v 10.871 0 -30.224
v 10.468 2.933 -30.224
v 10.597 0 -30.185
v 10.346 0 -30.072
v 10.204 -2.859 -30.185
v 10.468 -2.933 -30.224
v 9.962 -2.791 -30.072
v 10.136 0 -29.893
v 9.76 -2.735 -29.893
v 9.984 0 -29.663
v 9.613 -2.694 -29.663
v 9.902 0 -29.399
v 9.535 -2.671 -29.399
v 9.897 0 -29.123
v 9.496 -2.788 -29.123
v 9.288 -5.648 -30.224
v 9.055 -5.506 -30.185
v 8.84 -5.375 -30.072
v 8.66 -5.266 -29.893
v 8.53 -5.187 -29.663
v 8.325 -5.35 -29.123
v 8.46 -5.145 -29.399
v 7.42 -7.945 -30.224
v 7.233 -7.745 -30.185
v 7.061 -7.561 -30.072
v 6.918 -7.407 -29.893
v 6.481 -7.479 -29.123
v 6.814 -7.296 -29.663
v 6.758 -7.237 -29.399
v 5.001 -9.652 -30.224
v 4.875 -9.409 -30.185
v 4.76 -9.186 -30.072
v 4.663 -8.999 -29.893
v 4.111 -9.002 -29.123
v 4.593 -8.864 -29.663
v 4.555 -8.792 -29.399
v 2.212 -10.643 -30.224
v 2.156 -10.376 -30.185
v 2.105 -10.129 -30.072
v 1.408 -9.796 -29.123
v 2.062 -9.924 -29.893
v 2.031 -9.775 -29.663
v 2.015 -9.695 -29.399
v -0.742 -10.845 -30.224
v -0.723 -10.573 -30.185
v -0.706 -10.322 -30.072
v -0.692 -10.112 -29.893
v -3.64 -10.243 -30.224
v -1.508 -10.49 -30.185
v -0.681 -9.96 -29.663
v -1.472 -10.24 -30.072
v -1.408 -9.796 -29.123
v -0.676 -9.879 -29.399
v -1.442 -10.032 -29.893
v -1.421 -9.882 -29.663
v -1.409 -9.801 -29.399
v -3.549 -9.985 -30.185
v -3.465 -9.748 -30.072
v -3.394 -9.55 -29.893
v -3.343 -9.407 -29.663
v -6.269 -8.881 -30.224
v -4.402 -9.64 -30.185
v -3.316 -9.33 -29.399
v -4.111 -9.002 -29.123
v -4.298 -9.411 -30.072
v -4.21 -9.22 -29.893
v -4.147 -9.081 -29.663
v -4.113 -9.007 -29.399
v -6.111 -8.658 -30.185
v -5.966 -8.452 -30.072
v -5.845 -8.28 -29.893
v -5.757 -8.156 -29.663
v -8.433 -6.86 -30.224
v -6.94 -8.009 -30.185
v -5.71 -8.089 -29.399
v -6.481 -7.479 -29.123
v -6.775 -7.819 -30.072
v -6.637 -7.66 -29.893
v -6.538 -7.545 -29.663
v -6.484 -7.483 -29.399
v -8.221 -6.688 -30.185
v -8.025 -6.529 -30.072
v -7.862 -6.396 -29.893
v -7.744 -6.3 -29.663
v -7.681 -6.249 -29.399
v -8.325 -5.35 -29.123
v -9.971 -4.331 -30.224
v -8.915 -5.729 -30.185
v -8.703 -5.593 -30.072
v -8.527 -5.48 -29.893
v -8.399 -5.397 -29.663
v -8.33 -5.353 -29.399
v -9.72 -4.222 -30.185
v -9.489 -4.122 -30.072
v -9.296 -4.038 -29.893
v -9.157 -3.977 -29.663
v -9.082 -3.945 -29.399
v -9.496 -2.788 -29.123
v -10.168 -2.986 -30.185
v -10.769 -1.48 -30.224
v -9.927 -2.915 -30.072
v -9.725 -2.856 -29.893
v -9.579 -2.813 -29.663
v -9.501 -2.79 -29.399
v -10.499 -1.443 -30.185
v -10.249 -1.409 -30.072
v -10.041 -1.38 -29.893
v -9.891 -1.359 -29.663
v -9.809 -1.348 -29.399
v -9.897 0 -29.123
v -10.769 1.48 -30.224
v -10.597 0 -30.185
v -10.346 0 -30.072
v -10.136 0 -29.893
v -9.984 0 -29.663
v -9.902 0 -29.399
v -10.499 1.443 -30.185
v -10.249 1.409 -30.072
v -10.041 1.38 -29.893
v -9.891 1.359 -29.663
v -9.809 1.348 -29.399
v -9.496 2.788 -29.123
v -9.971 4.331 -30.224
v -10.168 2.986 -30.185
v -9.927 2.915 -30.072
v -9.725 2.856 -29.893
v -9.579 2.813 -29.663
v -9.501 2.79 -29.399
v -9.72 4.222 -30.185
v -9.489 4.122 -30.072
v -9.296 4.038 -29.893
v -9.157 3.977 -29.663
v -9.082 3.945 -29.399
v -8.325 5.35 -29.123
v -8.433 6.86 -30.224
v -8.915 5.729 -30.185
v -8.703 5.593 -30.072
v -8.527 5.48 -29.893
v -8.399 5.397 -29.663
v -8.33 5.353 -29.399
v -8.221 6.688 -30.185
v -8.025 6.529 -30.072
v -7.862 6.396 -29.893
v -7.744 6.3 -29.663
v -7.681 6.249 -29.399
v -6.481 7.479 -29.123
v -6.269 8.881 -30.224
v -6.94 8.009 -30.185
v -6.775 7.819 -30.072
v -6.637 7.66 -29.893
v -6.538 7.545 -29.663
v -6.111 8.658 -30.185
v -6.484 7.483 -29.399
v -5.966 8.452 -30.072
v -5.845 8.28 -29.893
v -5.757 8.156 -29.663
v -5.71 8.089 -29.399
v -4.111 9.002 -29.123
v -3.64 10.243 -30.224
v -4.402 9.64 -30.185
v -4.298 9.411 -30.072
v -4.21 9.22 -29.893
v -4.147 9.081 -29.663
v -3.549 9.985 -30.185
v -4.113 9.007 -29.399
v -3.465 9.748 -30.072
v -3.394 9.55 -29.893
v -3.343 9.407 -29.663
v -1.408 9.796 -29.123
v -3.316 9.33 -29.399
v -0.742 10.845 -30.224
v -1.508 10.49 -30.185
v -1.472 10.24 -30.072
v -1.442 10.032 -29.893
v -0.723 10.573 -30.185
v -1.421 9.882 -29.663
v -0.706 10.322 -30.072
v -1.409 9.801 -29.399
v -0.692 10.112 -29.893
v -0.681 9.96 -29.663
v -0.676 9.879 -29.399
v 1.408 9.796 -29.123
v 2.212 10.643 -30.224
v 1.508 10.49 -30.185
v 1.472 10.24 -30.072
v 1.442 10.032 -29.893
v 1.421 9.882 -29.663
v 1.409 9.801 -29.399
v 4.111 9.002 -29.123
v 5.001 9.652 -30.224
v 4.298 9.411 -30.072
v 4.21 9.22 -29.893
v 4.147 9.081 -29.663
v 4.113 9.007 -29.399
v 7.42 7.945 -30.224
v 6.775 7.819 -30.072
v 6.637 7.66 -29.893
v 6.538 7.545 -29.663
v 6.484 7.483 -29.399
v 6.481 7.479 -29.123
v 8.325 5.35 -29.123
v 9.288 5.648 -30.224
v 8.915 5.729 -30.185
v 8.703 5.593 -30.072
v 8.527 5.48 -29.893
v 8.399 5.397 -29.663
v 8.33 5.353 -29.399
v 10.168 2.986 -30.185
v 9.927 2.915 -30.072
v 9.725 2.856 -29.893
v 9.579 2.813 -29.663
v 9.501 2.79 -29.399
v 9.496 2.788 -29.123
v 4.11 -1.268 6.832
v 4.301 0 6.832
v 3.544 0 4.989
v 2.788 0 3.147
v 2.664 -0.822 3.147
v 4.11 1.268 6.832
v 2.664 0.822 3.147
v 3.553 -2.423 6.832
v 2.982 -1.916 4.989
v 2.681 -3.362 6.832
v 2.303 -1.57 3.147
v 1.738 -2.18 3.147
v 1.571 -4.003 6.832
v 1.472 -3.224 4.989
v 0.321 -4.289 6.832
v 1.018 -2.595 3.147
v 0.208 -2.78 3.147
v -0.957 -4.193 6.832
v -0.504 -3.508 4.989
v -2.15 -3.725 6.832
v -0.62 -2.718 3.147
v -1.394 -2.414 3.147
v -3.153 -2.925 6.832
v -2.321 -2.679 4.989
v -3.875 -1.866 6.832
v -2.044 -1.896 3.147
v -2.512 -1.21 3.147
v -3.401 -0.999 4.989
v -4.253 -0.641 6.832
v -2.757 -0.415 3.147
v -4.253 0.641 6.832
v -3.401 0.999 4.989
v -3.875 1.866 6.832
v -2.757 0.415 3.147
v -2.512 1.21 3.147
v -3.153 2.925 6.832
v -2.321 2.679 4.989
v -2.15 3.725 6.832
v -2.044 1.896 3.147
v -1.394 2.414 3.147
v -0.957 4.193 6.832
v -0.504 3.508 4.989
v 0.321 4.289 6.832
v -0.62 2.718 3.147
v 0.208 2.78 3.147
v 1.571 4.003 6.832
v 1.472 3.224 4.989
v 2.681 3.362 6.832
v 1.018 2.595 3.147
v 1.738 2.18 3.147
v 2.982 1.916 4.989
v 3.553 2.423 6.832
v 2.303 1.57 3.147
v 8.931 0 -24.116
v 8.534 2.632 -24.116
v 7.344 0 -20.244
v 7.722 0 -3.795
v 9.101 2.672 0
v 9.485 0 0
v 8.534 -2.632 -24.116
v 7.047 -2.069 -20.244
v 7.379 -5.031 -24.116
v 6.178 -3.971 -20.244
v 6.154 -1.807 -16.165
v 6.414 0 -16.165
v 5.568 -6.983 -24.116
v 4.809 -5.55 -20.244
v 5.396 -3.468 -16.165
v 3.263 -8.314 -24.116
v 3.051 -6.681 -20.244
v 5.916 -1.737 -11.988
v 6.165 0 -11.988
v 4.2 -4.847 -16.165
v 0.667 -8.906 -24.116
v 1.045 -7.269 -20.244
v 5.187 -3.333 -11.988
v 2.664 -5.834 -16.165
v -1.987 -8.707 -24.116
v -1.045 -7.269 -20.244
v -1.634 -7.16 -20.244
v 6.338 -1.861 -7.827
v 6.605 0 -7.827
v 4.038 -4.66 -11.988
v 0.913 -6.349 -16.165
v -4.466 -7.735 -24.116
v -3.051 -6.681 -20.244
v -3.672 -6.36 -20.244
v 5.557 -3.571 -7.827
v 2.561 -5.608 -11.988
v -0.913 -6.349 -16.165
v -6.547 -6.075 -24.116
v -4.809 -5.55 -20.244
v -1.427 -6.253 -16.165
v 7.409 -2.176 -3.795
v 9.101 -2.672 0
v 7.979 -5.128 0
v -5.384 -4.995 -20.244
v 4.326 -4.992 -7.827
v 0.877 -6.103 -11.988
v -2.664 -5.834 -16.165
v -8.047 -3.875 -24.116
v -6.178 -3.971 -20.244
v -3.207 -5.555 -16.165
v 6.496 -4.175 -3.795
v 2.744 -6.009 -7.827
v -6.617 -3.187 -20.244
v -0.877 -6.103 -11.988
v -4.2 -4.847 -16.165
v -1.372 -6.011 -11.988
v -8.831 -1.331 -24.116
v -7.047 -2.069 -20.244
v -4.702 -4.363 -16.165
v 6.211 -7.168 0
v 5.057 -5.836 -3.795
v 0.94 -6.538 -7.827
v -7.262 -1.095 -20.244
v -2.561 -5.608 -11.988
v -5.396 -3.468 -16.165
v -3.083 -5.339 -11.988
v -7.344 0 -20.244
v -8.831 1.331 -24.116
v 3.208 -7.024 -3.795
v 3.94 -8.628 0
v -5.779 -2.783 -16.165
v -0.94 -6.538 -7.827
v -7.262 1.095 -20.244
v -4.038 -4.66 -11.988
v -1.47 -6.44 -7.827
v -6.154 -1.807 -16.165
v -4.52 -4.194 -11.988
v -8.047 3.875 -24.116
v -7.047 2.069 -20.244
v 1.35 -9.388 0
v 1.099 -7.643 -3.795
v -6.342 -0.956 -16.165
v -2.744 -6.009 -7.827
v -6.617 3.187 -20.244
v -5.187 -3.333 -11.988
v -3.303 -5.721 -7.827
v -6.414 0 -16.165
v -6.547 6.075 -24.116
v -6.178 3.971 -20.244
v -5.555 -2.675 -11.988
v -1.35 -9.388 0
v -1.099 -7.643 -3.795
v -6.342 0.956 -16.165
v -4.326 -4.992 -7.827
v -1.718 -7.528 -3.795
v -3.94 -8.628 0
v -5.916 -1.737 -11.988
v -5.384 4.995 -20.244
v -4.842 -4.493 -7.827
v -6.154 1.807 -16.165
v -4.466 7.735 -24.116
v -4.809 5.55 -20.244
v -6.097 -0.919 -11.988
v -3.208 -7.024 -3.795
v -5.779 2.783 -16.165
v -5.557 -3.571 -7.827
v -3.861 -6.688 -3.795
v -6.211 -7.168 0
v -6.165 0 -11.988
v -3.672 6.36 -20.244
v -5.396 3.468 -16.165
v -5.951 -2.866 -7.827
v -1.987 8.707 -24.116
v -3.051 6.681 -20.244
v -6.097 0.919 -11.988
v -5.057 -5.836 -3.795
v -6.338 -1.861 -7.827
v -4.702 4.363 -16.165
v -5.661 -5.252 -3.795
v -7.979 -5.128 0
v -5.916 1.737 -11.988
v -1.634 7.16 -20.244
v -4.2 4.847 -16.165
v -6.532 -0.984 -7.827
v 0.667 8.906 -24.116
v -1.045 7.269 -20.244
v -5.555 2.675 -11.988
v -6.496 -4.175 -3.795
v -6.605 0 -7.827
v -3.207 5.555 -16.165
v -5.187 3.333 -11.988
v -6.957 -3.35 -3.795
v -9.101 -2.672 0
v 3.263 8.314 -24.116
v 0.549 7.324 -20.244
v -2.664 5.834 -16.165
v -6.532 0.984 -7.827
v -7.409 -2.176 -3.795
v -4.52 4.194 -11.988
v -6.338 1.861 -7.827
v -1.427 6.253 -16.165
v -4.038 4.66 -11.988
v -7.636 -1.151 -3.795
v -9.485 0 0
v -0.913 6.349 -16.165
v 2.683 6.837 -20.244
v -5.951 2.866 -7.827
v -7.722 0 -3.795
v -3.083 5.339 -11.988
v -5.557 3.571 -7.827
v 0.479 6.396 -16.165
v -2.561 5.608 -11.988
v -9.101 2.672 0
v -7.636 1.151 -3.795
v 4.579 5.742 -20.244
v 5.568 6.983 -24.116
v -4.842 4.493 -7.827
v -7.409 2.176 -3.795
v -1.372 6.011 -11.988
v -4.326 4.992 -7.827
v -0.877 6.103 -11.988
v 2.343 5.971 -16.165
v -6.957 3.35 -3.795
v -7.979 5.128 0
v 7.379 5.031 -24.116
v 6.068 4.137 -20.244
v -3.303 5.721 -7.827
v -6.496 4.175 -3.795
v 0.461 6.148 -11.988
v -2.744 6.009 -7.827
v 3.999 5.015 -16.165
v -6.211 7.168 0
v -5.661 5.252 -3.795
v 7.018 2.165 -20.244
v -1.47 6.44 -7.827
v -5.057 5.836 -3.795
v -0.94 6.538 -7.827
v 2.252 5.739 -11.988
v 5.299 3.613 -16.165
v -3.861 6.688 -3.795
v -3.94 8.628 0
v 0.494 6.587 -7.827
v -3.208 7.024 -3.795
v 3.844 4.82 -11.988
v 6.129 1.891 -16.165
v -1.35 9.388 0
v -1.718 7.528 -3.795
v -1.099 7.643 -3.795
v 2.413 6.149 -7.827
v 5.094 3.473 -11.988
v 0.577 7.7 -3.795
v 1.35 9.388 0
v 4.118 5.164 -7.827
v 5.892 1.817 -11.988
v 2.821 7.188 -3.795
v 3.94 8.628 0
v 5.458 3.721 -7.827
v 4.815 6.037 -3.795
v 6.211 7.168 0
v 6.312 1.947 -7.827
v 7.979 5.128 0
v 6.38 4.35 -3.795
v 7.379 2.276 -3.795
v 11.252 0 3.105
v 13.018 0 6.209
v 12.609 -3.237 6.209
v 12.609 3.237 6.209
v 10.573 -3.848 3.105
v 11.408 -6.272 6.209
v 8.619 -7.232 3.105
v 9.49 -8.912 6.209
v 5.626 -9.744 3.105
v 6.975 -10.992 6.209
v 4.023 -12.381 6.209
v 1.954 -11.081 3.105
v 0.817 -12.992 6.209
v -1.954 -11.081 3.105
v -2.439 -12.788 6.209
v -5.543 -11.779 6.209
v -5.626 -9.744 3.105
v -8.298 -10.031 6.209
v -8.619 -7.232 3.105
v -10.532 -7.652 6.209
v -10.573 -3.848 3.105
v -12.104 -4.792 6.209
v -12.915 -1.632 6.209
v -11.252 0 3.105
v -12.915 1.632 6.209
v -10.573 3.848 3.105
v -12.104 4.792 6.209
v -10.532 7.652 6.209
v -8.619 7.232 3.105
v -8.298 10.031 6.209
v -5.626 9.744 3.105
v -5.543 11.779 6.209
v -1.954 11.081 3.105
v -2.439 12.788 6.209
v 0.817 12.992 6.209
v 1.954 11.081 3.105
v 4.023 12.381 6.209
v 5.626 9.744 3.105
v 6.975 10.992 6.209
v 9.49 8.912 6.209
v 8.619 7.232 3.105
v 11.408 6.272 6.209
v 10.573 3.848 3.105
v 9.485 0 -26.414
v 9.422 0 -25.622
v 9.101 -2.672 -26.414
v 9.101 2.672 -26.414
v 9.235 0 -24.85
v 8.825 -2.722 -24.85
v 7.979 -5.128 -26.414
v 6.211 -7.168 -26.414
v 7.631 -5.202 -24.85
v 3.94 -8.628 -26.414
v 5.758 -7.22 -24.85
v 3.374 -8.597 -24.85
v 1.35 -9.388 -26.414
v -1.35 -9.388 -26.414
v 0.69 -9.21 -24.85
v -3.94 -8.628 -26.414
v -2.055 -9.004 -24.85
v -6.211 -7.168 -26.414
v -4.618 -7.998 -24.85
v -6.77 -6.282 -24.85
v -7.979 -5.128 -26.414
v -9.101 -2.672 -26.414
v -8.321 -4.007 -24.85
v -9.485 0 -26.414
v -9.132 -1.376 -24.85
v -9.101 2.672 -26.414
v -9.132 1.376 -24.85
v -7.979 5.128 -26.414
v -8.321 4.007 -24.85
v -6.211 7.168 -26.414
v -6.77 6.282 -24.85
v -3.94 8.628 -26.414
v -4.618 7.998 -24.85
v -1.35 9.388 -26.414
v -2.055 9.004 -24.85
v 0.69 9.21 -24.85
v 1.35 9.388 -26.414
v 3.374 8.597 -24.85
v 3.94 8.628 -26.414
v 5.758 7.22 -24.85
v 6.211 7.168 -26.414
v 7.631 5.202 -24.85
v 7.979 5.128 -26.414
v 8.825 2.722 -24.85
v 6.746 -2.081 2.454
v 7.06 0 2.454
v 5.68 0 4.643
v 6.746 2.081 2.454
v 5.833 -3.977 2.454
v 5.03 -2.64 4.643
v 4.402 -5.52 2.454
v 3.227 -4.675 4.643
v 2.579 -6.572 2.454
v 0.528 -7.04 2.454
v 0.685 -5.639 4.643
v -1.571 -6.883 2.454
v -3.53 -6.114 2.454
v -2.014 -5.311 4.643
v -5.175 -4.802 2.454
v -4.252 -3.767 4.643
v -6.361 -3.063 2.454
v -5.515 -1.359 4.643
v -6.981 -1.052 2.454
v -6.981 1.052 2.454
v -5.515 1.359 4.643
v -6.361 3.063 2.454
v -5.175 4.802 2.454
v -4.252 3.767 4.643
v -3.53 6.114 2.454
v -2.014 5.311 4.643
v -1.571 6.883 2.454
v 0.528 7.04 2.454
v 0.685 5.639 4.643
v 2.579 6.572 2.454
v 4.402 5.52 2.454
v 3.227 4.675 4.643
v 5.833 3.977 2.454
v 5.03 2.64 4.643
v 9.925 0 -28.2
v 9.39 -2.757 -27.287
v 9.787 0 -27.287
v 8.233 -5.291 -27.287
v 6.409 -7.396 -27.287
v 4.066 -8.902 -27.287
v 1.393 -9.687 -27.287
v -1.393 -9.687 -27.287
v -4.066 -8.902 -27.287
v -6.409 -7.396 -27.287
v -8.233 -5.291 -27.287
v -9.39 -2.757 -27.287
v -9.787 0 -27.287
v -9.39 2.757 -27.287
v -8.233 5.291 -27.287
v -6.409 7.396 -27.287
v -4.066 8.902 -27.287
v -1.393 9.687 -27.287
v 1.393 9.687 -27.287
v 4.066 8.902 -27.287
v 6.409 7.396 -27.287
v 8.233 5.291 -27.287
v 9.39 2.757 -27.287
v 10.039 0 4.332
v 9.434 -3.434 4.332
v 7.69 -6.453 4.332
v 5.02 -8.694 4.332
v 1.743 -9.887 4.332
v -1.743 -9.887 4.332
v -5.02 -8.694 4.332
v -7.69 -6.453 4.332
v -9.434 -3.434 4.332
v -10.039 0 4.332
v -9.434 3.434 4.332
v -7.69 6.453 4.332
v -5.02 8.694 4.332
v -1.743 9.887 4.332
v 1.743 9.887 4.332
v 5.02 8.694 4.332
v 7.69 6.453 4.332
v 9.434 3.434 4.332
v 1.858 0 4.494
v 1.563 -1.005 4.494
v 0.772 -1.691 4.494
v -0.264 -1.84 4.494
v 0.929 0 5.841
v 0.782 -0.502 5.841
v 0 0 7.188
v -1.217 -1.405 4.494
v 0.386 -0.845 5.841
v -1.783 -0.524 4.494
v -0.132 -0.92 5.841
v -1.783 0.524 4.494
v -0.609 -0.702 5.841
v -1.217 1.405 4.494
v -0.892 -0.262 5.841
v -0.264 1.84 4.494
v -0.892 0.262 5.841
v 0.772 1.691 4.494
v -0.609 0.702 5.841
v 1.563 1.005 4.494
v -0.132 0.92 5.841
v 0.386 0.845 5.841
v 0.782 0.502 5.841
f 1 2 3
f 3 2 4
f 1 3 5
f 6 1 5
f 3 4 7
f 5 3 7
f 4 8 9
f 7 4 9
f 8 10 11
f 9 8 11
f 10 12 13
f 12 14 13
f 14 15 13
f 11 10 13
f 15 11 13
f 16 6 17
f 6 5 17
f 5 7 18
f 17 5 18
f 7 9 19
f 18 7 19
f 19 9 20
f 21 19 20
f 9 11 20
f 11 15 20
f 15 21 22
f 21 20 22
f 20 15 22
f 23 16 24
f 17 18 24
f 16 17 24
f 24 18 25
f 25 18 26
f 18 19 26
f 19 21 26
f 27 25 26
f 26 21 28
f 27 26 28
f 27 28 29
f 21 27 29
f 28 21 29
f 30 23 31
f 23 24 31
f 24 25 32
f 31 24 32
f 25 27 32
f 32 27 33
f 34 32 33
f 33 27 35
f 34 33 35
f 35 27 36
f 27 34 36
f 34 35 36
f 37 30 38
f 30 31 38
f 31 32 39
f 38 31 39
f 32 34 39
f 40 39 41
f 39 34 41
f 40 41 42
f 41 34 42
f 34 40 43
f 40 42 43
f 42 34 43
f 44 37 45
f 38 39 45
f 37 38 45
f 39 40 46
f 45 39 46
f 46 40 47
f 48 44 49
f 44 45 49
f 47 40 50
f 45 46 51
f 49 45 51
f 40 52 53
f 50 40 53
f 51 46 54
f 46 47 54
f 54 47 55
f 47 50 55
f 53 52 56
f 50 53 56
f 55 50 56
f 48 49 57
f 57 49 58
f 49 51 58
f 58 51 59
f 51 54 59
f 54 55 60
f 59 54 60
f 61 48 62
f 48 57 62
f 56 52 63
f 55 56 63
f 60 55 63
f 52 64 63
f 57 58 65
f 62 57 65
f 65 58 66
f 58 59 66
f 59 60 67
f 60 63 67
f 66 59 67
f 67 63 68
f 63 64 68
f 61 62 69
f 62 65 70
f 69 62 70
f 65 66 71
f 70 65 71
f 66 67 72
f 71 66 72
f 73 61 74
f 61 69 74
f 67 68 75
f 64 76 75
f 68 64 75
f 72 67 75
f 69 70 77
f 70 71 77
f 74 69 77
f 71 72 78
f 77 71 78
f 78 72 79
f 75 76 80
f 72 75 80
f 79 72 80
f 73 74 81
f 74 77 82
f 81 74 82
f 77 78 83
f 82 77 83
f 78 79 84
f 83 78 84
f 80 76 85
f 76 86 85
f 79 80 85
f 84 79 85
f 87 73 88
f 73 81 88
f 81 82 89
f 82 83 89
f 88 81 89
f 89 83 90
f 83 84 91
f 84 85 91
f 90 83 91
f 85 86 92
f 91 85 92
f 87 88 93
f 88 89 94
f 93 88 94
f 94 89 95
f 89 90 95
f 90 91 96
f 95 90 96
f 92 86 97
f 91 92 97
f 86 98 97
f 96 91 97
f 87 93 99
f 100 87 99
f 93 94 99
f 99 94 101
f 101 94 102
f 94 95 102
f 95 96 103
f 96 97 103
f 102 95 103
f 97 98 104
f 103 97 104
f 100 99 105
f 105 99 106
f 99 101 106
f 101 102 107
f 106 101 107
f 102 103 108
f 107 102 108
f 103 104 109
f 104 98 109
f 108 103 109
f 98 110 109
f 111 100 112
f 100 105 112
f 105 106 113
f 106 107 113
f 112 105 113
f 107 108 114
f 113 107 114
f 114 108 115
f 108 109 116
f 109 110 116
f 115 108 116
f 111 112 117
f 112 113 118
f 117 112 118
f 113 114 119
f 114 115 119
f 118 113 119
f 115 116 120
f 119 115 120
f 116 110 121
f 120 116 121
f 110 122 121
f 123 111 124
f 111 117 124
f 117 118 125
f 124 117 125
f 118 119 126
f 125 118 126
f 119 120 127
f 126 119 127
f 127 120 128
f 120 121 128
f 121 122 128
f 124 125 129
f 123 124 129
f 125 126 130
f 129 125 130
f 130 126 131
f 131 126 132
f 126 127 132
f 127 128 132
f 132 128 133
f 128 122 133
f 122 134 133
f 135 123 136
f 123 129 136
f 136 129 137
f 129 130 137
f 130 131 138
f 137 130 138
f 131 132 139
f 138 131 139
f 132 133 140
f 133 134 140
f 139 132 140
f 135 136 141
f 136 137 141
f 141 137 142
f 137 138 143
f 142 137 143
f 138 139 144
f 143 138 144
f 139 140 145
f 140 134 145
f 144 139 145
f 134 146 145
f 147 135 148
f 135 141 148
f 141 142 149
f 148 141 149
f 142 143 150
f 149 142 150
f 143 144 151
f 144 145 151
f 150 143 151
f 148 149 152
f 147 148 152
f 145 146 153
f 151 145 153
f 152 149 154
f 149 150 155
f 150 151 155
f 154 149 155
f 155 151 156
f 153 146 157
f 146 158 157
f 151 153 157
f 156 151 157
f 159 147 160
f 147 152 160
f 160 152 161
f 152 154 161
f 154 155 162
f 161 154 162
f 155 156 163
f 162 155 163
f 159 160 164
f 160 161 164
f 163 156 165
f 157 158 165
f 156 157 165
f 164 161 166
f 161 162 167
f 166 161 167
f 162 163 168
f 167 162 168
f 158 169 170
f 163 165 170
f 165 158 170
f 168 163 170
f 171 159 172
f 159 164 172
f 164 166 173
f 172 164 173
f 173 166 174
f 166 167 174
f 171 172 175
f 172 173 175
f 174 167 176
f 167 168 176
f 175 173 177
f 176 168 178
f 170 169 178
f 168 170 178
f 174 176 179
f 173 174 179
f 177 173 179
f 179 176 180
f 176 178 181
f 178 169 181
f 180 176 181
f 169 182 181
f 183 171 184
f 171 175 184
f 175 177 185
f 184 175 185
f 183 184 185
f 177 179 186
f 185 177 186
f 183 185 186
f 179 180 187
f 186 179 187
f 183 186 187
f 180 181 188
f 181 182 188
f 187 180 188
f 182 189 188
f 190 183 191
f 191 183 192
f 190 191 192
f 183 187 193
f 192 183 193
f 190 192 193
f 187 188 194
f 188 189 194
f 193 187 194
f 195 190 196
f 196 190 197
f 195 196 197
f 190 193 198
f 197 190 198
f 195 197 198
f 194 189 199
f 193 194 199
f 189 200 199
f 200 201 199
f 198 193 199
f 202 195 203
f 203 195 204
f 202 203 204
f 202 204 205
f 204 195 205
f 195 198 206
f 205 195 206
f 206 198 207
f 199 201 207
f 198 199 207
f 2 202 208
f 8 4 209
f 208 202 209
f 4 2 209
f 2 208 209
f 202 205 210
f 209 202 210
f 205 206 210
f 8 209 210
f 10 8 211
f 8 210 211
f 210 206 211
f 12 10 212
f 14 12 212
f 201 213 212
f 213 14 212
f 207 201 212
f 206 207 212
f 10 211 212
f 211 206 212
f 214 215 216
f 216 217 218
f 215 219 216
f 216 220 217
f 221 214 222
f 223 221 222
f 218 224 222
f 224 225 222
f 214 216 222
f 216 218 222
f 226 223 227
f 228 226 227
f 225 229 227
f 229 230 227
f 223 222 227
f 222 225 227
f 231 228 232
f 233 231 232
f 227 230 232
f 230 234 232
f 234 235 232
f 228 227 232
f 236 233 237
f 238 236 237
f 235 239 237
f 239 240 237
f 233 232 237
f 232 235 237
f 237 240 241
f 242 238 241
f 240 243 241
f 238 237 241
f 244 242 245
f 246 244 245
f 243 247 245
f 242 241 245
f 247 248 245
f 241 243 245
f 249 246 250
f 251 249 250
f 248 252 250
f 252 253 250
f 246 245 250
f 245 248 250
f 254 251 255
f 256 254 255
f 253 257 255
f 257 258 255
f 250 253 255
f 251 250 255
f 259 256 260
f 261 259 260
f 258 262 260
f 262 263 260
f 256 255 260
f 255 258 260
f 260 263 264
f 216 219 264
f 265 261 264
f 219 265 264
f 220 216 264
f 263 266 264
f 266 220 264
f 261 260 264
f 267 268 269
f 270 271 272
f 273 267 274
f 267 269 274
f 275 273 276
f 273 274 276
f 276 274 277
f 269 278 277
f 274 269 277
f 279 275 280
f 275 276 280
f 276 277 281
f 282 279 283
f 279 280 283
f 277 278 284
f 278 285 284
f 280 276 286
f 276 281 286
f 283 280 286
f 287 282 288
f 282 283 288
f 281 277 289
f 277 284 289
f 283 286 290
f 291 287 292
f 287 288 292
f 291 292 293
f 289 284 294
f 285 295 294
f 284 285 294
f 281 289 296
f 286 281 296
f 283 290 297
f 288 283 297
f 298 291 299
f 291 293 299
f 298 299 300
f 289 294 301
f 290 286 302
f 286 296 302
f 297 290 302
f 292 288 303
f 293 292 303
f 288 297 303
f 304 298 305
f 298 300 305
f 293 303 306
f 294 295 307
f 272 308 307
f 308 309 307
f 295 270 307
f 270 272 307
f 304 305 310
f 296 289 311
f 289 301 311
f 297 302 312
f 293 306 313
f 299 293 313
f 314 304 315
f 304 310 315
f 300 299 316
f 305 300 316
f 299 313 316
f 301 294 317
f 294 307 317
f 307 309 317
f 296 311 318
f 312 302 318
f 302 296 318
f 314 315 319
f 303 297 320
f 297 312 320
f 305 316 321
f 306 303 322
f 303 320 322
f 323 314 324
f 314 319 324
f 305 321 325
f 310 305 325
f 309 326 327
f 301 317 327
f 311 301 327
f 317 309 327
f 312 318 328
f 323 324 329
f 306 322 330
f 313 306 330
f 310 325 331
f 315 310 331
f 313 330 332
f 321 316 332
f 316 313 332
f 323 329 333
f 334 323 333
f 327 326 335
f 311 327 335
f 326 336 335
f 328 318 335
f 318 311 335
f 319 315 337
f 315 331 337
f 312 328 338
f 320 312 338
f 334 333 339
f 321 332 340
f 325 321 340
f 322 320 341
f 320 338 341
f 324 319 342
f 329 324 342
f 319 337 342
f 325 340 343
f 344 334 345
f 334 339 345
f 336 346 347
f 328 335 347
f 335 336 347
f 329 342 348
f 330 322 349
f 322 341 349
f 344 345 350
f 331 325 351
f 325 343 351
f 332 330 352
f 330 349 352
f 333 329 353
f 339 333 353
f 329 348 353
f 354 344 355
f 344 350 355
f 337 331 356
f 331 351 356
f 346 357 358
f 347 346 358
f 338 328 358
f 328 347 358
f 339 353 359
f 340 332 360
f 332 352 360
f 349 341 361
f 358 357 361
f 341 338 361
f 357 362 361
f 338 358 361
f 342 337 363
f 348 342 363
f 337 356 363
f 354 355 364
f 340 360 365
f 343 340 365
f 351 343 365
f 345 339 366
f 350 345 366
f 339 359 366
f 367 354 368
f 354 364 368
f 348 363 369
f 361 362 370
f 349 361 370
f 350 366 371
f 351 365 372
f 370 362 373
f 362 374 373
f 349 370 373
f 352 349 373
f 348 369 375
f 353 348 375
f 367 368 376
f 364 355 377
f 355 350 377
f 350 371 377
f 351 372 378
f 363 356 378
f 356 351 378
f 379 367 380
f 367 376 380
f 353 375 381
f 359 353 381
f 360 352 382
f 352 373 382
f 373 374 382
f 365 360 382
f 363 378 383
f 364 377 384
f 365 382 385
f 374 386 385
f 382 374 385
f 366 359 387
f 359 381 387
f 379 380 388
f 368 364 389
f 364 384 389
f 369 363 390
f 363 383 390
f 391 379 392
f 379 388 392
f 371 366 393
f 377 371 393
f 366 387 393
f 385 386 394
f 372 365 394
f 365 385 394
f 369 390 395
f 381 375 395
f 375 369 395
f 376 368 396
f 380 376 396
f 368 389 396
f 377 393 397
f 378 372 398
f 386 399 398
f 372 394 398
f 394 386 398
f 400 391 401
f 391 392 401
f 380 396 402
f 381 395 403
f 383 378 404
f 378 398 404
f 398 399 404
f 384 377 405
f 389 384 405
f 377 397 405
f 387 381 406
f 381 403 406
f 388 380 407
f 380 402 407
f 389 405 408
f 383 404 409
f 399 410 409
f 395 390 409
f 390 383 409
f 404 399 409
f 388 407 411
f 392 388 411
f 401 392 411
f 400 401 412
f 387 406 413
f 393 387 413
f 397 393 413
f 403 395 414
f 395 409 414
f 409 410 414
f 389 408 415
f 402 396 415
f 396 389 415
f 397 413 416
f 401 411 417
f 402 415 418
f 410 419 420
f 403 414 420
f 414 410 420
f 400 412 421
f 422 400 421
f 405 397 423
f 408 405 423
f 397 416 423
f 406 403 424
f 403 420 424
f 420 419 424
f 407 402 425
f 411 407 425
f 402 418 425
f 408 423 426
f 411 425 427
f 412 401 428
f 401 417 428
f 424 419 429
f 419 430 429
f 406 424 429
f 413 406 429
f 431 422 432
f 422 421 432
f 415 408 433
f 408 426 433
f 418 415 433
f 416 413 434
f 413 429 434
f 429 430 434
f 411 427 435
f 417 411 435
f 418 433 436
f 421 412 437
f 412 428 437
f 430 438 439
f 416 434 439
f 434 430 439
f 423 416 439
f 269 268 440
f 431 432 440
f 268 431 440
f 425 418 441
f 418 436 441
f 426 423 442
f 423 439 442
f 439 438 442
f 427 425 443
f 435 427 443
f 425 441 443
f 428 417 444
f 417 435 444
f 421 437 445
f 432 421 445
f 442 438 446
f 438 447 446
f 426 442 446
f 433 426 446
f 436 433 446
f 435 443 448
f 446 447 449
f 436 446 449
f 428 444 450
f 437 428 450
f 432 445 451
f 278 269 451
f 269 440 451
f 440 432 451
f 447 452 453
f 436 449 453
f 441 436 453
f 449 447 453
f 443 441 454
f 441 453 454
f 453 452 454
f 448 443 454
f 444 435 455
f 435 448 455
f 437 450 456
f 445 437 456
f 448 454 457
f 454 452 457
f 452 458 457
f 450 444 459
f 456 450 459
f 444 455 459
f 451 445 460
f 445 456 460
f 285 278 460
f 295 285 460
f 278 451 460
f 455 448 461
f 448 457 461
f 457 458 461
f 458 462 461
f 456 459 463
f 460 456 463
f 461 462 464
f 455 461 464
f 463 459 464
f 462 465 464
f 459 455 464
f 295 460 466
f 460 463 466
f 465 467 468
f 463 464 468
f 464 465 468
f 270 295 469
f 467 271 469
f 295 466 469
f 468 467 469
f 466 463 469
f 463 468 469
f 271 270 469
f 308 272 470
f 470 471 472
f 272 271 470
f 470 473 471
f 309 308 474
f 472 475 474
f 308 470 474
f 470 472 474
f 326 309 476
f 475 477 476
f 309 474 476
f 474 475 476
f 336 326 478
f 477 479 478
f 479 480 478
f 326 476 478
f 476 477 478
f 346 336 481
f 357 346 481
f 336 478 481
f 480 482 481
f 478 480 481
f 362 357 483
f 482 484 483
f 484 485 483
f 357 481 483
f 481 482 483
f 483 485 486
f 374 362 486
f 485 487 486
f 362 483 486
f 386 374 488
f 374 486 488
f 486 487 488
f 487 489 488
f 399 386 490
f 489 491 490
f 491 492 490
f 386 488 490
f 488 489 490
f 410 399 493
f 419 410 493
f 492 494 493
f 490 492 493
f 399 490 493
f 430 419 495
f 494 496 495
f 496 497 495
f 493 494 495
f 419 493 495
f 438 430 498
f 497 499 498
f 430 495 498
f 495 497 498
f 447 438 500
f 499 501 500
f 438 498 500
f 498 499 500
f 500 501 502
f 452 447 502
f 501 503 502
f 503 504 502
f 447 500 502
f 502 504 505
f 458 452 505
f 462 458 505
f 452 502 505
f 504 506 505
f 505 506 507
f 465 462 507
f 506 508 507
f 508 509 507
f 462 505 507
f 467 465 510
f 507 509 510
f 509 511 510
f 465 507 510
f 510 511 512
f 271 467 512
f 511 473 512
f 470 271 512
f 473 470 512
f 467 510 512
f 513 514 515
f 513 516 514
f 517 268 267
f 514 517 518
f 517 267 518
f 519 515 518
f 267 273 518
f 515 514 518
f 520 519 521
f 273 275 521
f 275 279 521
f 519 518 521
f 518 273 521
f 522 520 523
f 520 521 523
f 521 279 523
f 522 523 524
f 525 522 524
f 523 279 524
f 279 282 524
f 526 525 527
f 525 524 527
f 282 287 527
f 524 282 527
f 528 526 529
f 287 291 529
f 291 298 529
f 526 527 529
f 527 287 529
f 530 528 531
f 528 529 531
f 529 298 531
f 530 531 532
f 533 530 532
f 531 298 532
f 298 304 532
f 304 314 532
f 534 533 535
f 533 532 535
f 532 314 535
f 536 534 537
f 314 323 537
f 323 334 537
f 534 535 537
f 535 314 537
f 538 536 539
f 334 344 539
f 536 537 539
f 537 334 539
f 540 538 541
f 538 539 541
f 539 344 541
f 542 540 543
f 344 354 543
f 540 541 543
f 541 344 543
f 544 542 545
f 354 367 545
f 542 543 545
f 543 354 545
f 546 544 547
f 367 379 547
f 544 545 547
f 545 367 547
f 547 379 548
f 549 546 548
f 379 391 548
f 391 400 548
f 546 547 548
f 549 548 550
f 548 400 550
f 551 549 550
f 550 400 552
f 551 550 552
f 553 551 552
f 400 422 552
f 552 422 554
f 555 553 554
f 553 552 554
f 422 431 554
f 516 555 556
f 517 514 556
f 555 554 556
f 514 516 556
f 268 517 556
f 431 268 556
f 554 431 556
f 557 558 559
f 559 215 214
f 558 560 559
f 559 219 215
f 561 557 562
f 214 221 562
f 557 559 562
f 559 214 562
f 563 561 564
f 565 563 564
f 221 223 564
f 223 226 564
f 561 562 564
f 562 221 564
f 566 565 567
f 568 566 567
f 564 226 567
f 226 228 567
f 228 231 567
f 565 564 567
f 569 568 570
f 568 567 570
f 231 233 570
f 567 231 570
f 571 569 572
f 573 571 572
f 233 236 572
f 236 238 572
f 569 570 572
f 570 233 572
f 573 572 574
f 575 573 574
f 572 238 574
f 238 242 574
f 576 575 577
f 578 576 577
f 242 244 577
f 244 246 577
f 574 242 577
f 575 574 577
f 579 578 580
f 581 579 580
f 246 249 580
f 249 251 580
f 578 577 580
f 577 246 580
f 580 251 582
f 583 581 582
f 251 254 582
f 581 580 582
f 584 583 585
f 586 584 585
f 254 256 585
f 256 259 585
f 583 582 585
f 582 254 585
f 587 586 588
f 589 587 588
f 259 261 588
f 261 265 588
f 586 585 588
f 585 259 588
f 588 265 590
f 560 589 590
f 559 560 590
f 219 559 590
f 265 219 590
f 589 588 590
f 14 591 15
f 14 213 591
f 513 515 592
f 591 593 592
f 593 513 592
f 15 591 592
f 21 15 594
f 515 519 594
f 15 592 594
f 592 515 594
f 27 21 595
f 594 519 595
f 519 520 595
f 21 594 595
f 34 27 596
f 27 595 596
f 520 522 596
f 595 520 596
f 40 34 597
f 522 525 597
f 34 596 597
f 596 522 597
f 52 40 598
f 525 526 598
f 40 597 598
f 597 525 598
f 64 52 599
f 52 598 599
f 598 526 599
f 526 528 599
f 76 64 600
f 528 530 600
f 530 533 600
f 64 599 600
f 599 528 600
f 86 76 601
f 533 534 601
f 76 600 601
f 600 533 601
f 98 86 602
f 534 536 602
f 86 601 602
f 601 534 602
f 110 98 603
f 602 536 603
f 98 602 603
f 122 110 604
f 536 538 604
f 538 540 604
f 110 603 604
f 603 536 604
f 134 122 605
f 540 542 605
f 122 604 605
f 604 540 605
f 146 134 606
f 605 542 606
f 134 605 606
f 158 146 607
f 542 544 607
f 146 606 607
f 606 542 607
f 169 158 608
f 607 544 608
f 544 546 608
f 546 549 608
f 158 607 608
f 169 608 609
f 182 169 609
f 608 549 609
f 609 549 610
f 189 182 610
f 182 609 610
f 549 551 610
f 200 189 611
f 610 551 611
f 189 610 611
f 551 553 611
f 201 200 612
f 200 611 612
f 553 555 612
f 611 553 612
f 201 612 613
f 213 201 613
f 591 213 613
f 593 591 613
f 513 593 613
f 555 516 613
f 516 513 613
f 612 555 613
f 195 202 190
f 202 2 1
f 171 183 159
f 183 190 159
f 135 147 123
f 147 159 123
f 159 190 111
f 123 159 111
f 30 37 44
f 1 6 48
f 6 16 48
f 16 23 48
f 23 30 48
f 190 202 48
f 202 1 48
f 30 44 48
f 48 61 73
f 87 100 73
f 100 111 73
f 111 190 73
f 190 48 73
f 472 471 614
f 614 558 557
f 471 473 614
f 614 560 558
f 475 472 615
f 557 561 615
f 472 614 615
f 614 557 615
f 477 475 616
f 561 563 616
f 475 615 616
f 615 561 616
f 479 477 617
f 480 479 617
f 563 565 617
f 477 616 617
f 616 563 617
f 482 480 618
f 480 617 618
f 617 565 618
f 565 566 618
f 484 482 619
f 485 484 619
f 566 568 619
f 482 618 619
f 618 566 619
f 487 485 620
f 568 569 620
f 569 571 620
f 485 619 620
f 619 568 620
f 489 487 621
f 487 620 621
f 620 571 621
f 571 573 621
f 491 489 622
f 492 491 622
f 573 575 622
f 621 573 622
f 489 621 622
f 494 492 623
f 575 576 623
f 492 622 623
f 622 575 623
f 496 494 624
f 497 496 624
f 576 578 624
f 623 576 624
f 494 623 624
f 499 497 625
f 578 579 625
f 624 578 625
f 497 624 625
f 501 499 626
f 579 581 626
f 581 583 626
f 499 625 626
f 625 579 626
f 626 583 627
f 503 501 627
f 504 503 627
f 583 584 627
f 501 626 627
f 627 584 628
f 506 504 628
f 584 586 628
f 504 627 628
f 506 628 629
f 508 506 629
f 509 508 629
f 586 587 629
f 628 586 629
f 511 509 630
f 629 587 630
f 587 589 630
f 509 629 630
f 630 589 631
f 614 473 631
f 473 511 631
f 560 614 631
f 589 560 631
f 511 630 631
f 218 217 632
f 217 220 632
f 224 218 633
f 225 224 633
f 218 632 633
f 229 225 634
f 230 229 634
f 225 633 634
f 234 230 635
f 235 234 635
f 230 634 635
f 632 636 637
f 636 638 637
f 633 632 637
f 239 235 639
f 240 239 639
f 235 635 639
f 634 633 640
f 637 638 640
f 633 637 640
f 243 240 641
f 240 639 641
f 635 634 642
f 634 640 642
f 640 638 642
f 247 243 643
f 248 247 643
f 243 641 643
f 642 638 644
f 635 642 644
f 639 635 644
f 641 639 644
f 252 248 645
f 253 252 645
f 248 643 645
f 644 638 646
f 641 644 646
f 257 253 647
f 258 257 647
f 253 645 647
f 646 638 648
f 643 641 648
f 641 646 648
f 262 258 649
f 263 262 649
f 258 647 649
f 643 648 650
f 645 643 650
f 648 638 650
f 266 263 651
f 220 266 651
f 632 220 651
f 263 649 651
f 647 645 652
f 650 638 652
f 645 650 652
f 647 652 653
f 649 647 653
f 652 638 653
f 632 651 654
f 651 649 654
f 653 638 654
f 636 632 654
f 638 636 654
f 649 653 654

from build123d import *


# Not quite as in the source:
# - a fillet or chamfer that OpenCascade refuses, or shapes differently, is made with other operations: its cross-section is extruded or revolved along the edge and cut away or added


with BuildPart() as f1:
    # F0 (on Front) → F1 (revolve)
    with BuildSketch(Plane.XZ):
        with BuildLine():
            Line((0, 7.1883308701), (0, -30.2243120968))
            Line((0, -30.2243120968), (10.8706858009, -30.2243120968))
            ThreePointArc((10.8706858009, -30.2243120968), (9.889180772, -29.2428070679), (10.8706858009, -28.261302039))
            Line((10.8706858009, -28.261302039), (9.4850324094, -26.413762942))
            Line((9.4850324094, -26.413762942), (9.4850324094, -25.1435805112))
            ThreePointArc((9.4850324094, -25.1435805112), (6.1587538552, -12.5717902556), (9.4850324094, 0))
            Line((9.4850324094, 0), (13.0181515325, 6.2093746912))
            Line((13.0181515325, 6.2093746912), (7.0601375774, 2.4540154263))
            Line((7.0601375774, 2.4540154263), (4.3007276076, 6.8319196288))
            Line((4.3007276076, 6.8319196288), (2.7877071407, 3.1468416564))
            Line((2.7877071407, 3.1468416564), (0, 7.1883308701))
        make_face()
    revolve(axis=Axis((0, 0, -11.5179906134), (0, 0, -1)))

    # F2: fillet of radius 5.08 on 3 edges, made by hand

    # F2_s1 → F2_t2 (revolve, cut)
    with BuildSketch(Plane.XZ):
        with BuildLine():
            ThreePointArc((9.8965199445, -29.1230030365), (9.8769062732, -27.7401129903), (9.4850324094, -26.413762942))
            Line((9.4850324094, -26.413762942), (9.577642948, -26.3719795942))
            ThreePointArc((9.577642948, -26.3719795942), (10.2591391248, -27.2765725167), (10.9519658206, -28.2003420652))
            Line((10.9519658206, -28.2003420652), (10.8706858009, -28.362902039))
            ThreePointArc((10.8706858009, -28.362902039), (10.2877069025, -28.5837407102), (9.9973602337, -29.1354044906))
            Line((9.9973602337, -29.1354044906), (9.8965199445, -29.1230030365))
        make_face()
    revolve(axis=Axis((0, 0, -28.261302039), (0, 0, -1)), mode=Mode.SUBTRACT)

    # F2_s3 → F2_t4 (revolve, cut)
    with BuildSketch(Plane.XZ):
        with BuildLine():
            ThreePointArc((9.4850324094, -26.413762942), (9.3435632486, -25.2320724327), (8.9310390894, -24.1157258013))
            Line((8.9310390894, -24.1157258013), (9.0215590688, -24.0695880366))
            ThreePointArc((9.0215590688, -24.0695880366), (9.2915699789, -24.584629862), (9.5733382381, -25.0933347091))
            Line((9.5733382381, -25.0933347091), (9.5866324094, -25.1435805112))
            Line((9.5866324094, -25.1435805112), (9.5866322552, -26.4135859201))
            Line((9.5866322552, -26.4135859201), (9.4850324094, -26.413762942))
        make_face()
    revolve(axis=Axis((0, 0, -25.1435805112), (0, 0, -1)), mode=Mode.SUBTRACT)


solid = f1.part
